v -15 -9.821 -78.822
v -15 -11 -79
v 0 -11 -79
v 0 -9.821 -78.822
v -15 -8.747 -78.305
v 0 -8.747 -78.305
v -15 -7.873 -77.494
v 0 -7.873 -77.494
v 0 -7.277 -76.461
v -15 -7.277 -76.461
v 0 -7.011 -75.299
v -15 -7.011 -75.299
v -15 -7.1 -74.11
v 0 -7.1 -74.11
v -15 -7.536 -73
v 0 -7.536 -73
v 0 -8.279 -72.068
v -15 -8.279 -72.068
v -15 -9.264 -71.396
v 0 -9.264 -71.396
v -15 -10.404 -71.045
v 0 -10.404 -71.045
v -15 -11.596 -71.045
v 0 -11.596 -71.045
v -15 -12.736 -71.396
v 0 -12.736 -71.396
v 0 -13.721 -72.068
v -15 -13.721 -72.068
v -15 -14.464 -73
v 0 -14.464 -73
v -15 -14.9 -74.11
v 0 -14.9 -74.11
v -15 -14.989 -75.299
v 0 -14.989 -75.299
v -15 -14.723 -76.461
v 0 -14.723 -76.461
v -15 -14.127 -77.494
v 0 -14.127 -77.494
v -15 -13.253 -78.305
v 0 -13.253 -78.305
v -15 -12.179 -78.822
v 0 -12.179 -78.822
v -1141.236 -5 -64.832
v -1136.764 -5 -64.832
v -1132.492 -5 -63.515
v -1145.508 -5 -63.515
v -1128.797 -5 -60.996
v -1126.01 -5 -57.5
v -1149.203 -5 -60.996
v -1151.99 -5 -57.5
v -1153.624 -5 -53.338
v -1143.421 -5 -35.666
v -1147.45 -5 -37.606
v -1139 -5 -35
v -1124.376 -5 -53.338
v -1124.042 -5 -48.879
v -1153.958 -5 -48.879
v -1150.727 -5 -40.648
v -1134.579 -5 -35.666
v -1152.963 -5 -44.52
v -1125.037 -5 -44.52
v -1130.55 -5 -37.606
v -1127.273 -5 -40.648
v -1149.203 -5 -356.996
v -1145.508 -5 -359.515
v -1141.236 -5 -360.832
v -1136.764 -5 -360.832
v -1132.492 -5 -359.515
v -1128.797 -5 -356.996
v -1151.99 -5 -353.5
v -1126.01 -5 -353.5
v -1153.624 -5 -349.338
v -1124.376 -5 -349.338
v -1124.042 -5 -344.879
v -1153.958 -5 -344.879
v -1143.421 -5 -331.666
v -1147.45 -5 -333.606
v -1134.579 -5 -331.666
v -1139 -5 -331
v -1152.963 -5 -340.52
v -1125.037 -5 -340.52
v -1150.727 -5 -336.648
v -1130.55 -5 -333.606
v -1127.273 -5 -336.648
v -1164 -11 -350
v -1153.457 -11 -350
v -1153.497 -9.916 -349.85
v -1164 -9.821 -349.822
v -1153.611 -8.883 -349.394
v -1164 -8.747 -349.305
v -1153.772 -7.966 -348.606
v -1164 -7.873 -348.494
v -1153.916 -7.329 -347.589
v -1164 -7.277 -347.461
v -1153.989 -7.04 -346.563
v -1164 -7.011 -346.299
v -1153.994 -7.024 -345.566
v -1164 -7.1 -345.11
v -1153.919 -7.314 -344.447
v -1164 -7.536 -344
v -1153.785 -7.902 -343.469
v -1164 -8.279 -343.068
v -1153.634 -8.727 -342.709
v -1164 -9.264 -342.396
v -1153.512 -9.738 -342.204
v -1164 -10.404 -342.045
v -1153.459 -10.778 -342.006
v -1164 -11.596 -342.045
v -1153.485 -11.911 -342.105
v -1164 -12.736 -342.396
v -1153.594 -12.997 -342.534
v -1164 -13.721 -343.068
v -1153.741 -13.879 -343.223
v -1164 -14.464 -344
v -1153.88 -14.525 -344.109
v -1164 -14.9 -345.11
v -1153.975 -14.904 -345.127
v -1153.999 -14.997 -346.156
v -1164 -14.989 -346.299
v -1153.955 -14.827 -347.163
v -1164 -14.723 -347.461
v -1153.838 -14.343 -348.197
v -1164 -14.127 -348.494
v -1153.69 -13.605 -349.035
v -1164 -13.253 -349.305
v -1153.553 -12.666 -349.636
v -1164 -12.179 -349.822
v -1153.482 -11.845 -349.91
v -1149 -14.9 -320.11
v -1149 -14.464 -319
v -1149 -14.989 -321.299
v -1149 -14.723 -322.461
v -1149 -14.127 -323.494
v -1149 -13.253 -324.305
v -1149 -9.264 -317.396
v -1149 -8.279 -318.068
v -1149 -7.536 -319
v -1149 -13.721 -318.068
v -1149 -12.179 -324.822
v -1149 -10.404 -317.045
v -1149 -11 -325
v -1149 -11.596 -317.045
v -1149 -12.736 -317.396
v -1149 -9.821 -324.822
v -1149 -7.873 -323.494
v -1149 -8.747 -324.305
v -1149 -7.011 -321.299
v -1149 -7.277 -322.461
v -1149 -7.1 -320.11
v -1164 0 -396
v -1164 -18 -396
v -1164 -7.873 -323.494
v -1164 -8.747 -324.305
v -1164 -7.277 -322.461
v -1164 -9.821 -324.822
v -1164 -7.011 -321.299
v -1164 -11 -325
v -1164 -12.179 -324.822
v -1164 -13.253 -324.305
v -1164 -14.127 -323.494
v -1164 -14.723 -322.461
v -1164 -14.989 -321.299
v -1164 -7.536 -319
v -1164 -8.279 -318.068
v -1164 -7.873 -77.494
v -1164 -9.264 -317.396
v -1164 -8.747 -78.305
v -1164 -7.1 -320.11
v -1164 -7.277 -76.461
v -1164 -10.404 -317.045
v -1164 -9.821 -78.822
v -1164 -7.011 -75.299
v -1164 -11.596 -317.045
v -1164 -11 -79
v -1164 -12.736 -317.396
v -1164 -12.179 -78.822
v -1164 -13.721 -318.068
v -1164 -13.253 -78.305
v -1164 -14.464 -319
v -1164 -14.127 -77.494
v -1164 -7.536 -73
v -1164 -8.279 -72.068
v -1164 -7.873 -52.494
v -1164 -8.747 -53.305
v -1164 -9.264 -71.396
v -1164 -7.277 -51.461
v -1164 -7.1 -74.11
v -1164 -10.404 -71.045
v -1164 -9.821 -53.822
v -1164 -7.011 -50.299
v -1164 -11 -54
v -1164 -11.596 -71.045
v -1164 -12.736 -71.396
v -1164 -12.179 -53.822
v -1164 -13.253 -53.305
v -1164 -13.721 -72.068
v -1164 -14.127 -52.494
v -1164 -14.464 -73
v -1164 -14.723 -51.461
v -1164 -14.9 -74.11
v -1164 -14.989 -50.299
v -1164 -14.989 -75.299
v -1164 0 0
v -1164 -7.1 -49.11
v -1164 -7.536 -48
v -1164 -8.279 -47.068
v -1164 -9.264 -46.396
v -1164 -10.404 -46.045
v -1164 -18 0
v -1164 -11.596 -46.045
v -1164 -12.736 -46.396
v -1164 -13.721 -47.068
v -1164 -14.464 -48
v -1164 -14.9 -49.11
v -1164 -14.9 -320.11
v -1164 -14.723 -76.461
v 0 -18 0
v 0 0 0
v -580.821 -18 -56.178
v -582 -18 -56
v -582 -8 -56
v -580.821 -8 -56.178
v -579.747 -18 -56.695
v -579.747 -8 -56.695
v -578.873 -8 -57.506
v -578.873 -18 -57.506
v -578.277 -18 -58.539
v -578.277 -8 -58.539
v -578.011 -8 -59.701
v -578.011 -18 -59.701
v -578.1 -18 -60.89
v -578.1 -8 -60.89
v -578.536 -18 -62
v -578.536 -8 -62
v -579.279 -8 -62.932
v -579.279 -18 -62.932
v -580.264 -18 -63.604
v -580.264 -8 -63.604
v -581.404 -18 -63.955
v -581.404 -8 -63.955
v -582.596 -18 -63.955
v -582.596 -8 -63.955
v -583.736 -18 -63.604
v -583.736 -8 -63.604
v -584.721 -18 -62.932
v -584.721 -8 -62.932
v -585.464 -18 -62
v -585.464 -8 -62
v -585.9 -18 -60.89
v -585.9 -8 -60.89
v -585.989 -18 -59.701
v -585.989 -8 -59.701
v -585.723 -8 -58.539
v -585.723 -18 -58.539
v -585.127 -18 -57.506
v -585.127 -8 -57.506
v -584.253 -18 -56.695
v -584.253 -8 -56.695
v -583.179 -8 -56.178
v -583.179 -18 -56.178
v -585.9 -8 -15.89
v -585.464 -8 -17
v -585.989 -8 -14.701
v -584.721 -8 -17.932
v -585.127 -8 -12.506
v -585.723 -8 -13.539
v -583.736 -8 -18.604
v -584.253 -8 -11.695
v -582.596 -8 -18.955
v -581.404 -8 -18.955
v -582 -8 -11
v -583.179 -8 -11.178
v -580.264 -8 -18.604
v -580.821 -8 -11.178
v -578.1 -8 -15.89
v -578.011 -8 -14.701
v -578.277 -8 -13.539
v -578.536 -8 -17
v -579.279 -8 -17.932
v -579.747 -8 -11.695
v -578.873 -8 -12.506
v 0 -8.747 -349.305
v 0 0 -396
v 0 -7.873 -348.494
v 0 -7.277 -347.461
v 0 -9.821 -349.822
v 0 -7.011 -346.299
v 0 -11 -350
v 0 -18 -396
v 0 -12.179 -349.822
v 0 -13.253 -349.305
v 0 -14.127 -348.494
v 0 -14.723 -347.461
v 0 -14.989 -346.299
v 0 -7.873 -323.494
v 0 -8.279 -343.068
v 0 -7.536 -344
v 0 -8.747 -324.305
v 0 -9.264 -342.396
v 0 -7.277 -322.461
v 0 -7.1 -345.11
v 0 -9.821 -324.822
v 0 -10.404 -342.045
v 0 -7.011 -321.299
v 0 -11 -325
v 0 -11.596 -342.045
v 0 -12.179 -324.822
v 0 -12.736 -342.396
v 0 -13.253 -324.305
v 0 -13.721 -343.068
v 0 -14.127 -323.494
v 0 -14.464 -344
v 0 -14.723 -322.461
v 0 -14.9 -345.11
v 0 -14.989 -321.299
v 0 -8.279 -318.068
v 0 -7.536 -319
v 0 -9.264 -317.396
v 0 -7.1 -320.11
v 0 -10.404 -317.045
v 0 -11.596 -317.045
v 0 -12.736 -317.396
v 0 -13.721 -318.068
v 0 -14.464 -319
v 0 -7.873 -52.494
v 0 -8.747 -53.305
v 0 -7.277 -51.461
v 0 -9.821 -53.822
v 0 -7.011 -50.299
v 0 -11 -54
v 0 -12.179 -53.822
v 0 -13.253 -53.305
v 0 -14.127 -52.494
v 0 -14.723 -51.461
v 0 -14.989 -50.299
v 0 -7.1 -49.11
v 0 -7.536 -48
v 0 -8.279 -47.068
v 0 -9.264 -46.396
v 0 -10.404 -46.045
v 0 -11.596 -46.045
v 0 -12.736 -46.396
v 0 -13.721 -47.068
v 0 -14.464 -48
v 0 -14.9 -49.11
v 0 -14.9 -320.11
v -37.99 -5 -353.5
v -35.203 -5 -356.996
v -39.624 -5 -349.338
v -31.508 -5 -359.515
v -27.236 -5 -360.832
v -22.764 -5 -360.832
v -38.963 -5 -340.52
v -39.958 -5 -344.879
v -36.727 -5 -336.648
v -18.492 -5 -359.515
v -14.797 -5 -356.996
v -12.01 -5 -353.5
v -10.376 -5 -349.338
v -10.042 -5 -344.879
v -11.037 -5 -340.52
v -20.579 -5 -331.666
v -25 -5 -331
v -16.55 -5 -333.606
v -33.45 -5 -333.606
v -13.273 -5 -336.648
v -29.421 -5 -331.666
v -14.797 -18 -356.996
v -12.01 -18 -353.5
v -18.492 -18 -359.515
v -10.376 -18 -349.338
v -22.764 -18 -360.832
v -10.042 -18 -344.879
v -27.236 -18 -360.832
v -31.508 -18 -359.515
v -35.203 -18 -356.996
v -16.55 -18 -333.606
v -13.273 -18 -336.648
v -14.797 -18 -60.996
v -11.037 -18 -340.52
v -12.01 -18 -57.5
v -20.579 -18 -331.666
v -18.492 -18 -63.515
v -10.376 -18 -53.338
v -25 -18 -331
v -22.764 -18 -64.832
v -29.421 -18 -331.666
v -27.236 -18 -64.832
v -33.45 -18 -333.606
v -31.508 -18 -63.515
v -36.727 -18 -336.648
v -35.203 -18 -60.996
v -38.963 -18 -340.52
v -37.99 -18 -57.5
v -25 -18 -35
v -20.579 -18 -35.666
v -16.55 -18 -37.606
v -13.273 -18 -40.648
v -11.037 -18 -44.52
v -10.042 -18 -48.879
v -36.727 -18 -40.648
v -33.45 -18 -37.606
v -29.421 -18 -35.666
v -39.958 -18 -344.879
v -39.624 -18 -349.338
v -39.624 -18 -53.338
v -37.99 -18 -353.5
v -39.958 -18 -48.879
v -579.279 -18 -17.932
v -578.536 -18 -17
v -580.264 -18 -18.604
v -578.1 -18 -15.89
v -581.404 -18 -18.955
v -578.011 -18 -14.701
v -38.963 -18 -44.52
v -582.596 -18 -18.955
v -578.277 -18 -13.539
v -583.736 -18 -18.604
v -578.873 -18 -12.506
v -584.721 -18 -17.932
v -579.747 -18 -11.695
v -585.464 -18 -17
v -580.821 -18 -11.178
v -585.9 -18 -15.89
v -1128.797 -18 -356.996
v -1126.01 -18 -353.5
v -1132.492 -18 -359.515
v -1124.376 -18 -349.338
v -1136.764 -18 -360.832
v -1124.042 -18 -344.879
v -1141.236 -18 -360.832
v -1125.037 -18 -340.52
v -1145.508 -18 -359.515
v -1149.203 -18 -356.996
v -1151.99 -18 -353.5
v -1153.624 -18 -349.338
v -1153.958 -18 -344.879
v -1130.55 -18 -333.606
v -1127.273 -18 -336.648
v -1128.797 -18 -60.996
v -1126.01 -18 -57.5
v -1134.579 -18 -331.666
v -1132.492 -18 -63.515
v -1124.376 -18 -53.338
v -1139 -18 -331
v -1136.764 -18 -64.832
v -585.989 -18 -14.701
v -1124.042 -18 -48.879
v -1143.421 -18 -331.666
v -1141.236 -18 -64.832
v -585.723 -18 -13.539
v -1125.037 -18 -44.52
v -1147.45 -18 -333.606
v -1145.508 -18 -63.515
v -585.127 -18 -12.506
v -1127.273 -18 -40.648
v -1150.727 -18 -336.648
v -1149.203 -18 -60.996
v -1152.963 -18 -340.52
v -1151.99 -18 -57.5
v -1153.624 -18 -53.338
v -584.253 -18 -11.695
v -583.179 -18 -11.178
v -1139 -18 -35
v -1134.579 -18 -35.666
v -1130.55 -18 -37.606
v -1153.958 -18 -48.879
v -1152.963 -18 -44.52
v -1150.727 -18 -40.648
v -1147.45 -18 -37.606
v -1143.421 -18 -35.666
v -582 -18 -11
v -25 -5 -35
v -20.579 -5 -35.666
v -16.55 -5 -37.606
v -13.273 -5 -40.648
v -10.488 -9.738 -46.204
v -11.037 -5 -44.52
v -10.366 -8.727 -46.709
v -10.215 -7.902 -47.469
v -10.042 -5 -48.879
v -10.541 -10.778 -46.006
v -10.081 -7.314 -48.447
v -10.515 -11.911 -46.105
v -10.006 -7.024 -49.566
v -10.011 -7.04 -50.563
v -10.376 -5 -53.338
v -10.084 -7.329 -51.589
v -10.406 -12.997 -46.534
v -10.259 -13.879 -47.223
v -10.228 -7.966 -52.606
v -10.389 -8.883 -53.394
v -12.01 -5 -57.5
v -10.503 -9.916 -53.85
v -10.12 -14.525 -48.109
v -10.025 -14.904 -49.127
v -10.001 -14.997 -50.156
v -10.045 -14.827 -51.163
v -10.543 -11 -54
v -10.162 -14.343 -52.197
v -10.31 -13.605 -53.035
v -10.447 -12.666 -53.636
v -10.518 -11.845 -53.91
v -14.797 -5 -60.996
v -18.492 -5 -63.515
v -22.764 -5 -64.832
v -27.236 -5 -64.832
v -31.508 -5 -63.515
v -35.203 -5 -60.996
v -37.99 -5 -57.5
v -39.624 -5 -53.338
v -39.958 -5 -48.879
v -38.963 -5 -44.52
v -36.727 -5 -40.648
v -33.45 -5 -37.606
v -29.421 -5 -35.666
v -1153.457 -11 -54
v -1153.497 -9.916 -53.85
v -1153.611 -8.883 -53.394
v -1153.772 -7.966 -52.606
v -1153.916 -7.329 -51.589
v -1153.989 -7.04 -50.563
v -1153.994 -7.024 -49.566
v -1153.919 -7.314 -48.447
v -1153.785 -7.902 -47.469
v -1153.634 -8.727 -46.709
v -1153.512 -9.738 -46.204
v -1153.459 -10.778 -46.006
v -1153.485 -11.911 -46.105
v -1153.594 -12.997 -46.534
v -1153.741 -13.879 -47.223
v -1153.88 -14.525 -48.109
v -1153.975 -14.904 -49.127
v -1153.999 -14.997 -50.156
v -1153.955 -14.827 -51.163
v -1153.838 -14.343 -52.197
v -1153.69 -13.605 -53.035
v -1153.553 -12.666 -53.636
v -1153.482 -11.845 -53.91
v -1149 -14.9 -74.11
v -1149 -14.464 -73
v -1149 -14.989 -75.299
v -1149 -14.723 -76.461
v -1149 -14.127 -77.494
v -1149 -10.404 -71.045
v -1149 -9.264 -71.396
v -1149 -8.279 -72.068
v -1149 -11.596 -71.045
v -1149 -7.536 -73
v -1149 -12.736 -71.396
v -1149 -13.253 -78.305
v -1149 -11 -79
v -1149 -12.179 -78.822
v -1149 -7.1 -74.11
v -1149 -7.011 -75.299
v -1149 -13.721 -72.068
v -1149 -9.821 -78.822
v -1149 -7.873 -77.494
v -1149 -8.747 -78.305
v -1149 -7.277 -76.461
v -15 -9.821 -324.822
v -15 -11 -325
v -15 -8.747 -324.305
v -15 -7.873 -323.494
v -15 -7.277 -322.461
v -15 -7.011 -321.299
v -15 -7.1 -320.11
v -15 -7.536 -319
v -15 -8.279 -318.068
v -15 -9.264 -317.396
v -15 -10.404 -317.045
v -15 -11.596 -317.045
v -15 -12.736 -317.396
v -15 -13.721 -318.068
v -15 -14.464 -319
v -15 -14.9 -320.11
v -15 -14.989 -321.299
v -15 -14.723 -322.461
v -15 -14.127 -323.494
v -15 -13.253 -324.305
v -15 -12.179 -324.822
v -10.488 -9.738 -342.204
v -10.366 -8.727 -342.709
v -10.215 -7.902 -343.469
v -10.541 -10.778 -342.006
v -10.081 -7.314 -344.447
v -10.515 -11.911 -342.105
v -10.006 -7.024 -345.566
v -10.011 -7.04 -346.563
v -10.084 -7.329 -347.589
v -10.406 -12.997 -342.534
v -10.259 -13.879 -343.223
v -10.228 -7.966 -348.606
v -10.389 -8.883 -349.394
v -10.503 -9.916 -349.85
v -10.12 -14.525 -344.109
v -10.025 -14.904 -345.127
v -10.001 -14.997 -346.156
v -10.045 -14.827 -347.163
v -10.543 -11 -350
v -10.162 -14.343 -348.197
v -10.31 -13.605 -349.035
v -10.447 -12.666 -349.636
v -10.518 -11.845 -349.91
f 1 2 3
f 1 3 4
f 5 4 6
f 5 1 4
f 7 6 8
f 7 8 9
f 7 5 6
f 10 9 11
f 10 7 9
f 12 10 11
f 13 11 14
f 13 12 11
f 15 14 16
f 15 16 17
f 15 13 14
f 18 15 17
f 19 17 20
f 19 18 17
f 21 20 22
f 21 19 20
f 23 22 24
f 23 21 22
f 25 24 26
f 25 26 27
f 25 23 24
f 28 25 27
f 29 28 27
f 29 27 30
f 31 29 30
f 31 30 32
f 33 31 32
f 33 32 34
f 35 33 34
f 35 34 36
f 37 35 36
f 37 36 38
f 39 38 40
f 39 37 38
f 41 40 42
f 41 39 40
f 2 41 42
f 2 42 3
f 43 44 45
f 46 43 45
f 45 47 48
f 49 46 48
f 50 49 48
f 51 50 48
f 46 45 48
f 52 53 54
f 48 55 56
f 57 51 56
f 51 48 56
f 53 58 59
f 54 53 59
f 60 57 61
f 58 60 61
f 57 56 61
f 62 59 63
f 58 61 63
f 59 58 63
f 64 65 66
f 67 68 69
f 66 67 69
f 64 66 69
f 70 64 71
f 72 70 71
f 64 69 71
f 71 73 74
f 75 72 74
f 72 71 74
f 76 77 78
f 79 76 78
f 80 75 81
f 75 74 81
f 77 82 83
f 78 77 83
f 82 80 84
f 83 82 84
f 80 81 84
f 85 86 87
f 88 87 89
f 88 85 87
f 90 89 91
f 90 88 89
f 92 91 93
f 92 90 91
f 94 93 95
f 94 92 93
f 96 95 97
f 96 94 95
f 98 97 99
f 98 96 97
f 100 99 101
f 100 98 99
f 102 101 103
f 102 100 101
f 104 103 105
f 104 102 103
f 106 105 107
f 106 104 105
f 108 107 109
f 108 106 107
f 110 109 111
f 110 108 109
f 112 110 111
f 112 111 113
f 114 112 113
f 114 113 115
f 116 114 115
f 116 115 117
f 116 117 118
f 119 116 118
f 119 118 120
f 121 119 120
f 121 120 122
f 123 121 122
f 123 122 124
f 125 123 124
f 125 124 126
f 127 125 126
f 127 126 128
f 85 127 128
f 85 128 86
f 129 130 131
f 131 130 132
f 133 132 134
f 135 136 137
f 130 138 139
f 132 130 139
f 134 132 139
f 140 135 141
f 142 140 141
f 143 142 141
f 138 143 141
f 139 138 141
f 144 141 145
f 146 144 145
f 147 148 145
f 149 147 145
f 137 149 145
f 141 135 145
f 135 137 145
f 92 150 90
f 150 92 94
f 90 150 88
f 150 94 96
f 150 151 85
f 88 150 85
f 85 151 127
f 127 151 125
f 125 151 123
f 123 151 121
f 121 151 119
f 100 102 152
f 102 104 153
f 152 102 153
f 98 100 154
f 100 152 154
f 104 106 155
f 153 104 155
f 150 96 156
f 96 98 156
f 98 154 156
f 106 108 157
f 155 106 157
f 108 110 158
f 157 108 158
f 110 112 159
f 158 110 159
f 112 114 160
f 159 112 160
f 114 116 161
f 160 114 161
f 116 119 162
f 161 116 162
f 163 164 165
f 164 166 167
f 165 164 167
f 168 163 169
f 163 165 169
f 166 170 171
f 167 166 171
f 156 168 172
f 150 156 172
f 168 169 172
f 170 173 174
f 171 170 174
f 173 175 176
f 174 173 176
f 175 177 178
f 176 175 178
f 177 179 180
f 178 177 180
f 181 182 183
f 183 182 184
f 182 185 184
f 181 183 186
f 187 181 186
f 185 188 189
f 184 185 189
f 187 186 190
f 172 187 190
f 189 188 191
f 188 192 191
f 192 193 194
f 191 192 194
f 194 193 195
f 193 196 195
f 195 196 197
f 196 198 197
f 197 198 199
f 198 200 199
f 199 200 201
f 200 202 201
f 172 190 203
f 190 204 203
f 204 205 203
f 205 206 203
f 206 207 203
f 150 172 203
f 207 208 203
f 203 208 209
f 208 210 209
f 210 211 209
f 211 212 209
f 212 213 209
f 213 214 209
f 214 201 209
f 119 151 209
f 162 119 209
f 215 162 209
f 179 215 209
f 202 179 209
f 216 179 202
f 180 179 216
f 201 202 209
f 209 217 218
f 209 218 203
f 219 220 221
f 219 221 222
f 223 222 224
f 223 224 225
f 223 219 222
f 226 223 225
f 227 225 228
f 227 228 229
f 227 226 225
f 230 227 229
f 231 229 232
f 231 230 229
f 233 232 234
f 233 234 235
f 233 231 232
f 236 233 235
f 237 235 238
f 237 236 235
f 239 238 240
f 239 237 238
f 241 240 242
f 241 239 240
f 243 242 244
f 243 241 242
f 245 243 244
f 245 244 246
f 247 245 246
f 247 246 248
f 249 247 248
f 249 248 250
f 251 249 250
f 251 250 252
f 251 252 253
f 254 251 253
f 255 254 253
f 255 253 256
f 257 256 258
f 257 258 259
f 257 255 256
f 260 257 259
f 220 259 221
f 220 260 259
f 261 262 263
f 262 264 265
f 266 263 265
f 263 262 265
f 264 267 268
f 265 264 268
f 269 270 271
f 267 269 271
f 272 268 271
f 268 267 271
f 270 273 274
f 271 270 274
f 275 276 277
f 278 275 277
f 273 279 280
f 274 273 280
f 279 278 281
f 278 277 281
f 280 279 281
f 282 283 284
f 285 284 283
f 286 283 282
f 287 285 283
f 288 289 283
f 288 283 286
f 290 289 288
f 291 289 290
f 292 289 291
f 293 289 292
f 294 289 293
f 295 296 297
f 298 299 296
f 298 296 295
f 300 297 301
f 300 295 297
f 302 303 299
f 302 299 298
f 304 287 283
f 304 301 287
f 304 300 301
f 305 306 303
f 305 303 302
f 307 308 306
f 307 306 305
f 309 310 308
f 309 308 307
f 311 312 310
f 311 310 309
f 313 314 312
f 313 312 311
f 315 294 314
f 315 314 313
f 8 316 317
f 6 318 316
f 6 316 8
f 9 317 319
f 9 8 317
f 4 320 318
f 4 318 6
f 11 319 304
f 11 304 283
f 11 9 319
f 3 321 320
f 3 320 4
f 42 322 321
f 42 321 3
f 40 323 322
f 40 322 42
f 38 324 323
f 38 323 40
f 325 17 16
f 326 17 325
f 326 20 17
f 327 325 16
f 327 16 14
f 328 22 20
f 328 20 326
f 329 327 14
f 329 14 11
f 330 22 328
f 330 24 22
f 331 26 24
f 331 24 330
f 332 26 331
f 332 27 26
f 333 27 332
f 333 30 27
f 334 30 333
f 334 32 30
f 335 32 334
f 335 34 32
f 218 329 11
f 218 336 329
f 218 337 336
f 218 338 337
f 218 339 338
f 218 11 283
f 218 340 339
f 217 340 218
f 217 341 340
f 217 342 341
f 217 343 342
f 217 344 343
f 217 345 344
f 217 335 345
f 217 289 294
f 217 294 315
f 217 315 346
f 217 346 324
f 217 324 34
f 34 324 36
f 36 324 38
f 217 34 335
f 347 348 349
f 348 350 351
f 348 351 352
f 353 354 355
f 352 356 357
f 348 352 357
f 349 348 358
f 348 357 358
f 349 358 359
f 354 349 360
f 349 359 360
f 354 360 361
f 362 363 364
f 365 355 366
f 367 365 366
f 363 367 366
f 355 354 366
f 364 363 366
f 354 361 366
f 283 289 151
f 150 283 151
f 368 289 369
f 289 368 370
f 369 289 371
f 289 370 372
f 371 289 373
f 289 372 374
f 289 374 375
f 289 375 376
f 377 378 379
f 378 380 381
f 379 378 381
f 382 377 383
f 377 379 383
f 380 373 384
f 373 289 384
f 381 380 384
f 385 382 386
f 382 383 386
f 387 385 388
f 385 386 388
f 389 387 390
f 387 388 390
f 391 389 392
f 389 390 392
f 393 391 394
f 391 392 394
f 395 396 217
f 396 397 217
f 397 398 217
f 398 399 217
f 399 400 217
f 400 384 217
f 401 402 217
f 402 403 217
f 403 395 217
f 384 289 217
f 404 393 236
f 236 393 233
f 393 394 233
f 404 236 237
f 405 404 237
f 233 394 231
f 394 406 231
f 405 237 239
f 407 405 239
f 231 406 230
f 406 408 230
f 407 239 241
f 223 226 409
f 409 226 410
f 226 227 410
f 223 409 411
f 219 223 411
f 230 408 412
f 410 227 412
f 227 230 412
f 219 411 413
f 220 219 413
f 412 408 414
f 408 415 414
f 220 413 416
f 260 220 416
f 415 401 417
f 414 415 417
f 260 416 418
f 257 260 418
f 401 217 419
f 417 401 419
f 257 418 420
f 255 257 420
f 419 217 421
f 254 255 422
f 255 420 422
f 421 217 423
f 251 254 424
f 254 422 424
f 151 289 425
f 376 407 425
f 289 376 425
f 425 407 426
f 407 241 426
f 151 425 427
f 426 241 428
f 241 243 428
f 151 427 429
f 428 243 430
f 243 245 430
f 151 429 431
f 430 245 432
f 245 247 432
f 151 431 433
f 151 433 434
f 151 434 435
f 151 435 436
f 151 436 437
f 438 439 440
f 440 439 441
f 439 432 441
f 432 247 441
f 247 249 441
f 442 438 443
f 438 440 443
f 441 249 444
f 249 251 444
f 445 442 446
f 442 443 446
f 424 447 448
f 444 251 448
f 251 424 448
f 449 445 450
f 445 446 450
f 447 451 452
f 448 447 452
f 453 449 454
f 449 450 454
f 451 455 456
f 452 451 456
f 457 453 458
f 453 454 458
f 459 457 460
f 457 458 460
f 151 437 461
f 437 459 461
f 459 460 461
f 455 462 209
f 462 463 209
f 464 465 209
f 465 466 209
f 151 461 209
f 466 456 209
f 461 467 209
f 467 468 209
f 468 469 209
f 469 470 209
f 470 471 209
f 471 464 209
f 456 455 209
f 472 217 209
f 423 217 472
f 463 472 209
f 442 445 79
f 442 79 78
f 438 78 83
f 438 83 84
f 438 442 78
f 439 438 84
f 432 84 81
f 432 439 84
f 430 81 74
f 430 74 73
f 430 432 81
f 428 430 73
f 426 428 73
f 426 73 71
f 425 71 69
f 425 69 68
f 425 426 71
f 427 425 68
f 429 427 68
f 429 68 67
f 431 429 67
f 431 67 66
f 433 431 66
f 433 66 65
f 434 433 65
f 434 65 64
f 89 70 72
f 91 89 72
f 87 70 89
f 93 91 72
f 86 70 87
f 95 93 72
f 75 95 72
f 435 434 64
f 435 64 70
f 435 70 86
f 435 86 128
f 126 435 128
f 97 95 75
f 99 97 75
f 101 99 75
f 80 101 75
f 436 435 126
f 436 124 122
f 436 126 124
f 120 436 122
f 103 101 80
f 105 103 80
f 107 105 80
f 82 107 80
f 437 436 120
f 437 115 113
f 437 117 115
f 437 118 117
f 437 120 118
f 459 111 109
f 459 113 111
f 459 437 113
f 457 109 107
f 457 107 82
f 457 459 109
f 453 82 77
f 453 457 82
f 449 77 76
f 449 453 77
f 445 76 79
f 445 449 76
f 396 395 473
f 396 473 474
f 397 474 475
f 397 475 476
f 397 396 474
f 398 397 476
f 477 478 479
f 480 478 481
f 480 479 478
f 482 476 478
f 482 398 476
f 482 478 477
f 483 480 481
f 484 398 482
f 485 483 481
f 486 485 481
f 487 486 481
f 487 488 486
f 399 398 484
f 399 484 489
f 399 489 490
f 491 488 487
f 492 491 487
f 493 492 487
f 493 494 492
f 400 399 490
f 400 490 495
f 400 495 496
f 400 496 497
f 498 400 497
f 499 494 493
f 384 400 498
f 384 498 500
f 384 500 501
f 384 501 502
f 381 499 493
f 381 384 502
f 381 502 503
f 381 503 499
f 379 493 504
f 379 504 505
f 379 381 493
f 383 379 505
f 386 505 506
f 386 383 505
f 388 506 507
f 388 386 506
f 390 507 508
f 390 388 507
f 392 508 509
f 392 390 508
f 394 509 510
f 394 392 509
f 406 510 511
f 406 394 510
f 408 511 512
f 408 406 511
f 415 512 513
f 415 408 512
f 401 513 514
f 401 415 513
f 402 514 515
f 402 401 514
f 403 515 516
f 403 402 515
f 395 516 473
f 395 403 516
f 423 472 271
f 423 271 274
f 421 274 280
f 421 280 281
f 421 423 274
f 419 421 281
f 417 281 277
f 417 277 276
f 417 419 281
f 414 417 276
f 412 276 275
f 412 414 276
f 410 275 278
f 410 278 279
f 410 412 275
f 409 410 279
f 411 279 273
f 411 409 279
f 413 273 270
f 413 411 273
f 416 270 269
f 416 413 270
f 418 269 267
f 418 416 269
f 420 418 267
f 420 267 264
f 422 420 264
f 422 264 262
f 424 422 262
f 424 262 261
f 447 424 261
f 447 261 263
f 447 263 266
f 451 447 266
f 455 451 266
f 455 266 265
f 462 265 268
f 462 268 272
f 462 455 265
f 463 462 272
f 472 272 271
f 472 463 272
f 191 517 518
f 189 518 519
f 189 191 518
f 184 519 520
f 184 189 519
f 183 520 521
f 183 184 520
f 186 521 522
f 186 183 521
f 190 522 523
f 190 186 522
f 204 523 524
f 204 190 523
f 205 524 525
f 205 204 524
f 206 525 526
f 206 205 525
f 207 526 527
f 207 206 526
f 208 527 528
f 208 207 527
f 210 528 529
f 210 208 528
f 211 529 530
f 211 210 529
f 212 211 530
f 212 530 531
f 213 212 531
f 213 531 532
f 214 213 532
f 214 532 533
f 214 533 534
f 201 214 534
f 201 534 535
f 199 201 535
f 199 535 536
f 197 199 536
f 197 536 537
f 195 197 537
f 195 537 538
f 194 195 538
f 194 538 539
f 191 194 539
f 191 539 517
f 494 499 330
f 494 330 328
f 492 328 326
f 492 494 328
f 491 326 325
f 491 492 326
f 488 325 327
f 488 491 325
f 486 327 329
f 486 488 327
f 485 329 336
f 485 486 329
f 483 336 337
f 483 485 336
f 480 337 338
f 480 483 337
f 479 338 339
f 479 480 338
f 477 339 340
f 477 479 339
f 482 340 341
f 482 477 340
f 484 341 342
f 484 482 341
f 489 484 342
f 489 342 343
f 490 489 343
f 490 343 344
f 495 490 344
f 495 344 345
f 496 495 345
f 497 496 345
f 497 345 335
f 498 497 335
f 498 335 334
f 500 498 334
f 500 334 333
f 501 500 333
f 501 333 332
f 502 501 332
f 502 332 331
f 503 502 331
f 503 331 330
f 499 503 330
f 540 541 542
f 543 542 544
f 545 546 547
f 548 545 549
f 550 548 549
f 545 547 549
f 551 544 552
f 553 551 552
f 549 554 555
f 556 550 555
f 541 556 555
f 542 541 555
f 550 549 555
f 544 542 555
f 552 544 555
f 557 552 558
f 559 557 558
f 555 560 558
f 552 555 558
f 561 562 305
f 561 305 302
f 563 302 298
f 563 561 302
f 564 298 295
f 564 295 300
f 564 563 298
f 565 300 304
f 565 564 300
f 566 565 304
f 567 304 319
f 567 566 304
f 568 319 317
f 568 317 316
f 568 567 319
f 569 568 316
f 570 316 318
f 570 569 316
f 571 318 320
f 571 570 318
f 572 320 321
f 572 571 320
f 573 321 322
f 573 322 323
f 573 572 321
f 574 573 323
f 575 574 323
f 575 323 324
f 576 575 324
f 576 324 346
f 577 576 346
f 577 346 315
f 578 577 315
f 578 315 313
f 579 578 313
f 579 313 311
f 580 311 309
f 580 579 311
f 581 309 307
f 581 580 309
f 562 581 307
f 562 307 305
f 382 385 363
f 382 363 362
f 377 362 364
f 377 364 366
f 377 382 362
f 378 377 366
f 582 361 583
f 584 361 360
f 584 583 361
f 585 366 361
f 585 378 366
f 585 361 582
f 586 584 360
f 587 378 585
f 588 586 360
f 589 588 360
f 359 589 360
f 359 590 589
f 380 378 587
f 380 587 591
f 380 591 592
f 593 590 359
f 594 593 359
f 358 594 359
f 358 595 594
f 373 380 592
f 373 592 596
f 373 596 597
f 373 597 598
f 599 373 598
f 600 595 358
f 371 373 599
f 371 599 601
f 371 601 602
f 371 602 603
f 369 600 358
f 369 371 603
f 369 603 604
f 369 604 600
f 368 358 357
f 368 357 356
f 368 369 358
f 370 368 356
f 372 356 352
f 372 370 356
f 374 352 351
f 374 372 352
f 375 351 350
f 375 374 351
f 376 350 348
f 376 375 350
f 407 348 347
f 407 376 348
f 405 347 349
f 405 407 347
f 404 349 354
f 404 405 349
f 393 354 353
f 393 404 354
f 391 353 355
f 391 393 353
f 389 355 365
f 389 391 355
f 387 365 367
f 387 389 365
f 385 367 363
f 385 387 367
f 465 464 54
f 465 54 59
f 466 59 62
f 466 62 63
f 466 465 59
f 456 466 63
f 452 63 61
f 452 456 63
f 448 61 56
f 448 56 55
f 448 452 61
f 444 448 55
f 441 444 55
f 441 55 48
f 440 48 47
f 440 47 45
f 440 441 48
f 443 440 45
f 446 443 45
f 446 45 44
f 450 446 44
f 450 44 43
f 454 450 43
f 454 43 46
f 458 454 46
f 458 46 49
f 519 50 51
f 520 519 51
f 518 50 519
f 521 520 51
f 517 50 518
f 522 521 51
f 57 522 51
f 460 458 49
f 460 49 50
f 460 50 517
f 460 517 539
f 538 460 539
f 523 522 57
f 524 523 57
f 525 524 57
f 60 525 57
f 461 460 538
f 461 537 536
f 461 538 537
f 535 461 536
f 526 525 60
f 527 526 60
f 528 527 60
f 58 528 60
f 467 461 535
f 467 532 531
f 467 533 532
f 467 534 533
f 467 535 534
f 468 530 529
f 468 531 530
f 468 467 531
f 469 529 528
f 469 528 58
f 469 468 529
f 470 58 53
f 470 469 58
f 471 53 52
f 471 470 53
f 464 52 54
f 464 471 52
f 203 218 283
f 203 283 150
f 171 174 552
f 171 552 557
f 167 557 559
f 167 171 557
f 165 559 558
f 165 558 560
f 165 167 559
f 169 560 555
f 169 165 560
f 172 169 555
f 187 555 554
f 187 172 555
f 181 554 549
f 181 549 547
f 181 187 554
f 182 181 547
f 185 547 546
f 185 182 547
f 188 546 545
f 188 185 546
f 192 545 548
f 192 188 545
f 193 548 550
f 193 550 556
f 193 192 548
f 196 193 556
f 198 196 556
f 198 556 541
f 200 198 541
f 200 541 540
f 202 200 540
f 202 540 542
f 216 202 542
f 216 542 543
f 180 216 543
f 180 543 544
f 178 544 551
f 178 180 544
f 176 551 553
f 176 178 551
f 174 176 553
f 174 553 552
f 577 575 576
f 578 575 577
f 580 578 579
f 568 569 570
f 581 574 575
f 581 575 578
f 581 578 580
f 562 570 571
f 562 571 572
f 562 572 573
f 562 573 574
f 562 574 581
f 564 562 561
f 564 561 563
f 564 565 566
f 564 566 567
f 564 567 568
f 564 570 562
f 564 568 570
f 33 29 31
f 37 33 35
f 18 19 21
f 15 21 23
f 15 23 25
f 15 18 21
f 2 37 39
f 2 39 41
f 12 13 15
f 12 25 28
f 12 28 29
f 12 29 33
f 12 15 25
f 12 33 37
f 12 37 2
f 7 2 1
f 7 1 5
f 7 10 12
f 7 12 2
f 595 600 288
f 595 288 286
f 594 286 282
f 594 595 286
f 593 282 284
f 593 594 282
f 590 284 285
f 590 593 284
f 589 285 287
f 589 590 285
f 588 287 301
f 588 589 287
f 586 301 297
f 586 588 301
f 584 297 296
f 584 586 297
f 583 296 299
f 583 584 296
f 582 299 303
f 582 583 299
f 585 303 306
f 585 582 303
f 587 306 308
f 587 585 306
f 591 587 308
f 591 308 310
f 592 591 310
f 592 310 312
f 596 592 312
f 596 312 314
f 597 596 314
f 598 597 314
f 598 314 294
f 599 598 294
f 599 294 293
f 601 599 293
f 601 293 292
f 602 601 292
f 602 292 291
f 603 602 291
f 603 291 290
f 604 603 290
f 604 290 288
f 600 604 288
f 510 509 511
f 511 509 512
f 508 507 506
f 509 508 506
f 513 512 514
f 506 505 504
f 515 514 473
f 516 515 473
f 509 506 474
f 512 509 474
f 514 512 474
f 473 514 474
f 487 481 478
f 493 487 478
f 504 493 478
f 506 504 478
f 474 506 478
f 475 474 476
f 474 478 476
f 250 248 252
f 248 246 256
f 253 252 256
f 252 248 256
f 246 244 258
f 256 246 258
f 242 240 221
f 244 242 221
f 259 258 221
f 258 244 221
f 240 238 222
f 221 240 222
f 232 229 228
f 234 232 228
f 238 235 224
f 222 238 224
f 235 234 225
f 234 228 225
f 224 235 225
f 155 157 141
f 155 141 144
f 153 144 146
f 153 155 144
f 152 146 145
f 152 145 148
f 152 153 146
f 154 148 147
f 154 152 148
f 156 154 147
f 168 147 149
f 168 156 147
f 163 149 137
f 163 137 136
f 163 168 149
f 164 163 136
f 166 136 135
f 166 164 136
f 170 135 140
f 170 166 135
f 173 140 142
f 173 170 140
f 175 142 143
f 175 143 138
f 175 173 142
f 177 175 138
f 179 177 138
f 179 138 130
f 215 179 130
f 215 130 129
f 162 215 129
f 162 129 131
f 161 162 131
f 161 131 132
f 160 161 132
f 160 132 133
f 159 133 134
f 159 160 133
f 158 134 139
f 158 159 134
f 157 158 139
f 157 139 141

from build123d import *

# Parameters (mm, degrees)
SKETCH1_W                = 1164
SKETCH1_H                = 396
BASE_PANEL_DEPTH         = 18
SKETCH2_R                = 4
EXTRUDE2_DEPTH           = 15
EXTRUDE3_START           = -15
SKETCH3_R                = 4
EXTRUDE3_DEPTH           = 15
SKETCH5_R                = 15
EXTRUDE17_DEPTH          = 13
TAGLIO_ESTRUSIONE1_START = -18
SKETCH4_2_R              = 4
TAGLIO_ESTRUSIONE1_DEPTH = 10


with BuildPart() as part:
    # Sketch1 → Base Panel (new body)
    with BuildSketch(Plane(origin=(0, -18, 0), x_dir=(-1, 0, 0), z_dir=(0, 1, 0))):
        with Locations((582, -198)):
            Rectangle(SKETCH1_W, SKETCH1_H)
    extrude(amount=BASE_PANEL_DEPTH)

    # Sketch2 → Extrude2 (cut)
    with BuildSketch(Plane(origin=(-1164, 0, 0), x_dir=(0, 0, -1), z_dir=(1, 0, 0))):
        with Locations((50, -11)):
            Circle(SKETCH2_R)
        with Locations((75, -11)):
            Circle(SKETCH2_R)
        with Locations((321, -11)):
            Circle(SKETCH2_R)
        with Locations((346, -11)):
            Circle(SKETCH2_R)
    extrude(amount=EXTRUDE2_DEPTH, mode=Mode.SUBTRACT)

    # Sketch3 → Extrude3 (cut)
    with BuildSketch(Plane(origin=(0, 0, 0), x_dir=(0, 0, -1), z_dir=(1, 0, 0)).offset(EXTRUDE3_START)):
        with Locations((346, -11)):
            Circle(SKETCH3_R)
        with Locations((321, -11)):
            Circle(SKETCH3_R)
        with Locations((75, -11)):
            Circle(SKETCH3_R)
        with Locations((50, -11)):
            Circle(SKETCH3_R)
    extrude(amount=EXTRUDE3_DEPTH, mode=Mode.SUBTRACT)

    # Sketch5 → Extrude17 (cut)
    with BuildSketch(Plane(origin=(0, -18, 0), x_dir=(-1, 0, 0), z_dir=(0, 1, 0))):
        with Locations(Location((25, -50, 0), (0, 0, 90))):
            Circle(SKETCH5_R)
        with Locations(Location((25, -346, 0), (0, 0, 90))):
            Circle(SKETCH5_R)
        with Locations(Location((1139, -50, 0), (0, 0, 90))):
            Circle(SKETCH5_R)
        with Locations(Location((1139, -346, 0), (0, 0, 90))):
            Circle(SKETCH5_R)
    extrude(amount=EXTRUDE17_DEPTH, mode=Mode.SUBTRACT)

    # Sketch4<2> → Taglio-Estrusione1 (cut)
    with BuildSketch(Plane(origin=(0, 0, 0), x_dir=(1, 0, 0), z_dir=(0, 1, 0)).offset(TAGLIO_ESTRUSIONE1_START)):
        with Locations(Location((-582, 15, 0), (0, 0, 270))):
            Circle(SKETCH4_2_R)
        with Locations(Location((-582, 60, 0), (0, 0, 270))):
            Circle(SKETCH4_2_R)
    extrude(amount=TAGLIO_ESTRUSIONE1_DEPTH, mode=Mode.SUBTRACT)


solid = part.part
